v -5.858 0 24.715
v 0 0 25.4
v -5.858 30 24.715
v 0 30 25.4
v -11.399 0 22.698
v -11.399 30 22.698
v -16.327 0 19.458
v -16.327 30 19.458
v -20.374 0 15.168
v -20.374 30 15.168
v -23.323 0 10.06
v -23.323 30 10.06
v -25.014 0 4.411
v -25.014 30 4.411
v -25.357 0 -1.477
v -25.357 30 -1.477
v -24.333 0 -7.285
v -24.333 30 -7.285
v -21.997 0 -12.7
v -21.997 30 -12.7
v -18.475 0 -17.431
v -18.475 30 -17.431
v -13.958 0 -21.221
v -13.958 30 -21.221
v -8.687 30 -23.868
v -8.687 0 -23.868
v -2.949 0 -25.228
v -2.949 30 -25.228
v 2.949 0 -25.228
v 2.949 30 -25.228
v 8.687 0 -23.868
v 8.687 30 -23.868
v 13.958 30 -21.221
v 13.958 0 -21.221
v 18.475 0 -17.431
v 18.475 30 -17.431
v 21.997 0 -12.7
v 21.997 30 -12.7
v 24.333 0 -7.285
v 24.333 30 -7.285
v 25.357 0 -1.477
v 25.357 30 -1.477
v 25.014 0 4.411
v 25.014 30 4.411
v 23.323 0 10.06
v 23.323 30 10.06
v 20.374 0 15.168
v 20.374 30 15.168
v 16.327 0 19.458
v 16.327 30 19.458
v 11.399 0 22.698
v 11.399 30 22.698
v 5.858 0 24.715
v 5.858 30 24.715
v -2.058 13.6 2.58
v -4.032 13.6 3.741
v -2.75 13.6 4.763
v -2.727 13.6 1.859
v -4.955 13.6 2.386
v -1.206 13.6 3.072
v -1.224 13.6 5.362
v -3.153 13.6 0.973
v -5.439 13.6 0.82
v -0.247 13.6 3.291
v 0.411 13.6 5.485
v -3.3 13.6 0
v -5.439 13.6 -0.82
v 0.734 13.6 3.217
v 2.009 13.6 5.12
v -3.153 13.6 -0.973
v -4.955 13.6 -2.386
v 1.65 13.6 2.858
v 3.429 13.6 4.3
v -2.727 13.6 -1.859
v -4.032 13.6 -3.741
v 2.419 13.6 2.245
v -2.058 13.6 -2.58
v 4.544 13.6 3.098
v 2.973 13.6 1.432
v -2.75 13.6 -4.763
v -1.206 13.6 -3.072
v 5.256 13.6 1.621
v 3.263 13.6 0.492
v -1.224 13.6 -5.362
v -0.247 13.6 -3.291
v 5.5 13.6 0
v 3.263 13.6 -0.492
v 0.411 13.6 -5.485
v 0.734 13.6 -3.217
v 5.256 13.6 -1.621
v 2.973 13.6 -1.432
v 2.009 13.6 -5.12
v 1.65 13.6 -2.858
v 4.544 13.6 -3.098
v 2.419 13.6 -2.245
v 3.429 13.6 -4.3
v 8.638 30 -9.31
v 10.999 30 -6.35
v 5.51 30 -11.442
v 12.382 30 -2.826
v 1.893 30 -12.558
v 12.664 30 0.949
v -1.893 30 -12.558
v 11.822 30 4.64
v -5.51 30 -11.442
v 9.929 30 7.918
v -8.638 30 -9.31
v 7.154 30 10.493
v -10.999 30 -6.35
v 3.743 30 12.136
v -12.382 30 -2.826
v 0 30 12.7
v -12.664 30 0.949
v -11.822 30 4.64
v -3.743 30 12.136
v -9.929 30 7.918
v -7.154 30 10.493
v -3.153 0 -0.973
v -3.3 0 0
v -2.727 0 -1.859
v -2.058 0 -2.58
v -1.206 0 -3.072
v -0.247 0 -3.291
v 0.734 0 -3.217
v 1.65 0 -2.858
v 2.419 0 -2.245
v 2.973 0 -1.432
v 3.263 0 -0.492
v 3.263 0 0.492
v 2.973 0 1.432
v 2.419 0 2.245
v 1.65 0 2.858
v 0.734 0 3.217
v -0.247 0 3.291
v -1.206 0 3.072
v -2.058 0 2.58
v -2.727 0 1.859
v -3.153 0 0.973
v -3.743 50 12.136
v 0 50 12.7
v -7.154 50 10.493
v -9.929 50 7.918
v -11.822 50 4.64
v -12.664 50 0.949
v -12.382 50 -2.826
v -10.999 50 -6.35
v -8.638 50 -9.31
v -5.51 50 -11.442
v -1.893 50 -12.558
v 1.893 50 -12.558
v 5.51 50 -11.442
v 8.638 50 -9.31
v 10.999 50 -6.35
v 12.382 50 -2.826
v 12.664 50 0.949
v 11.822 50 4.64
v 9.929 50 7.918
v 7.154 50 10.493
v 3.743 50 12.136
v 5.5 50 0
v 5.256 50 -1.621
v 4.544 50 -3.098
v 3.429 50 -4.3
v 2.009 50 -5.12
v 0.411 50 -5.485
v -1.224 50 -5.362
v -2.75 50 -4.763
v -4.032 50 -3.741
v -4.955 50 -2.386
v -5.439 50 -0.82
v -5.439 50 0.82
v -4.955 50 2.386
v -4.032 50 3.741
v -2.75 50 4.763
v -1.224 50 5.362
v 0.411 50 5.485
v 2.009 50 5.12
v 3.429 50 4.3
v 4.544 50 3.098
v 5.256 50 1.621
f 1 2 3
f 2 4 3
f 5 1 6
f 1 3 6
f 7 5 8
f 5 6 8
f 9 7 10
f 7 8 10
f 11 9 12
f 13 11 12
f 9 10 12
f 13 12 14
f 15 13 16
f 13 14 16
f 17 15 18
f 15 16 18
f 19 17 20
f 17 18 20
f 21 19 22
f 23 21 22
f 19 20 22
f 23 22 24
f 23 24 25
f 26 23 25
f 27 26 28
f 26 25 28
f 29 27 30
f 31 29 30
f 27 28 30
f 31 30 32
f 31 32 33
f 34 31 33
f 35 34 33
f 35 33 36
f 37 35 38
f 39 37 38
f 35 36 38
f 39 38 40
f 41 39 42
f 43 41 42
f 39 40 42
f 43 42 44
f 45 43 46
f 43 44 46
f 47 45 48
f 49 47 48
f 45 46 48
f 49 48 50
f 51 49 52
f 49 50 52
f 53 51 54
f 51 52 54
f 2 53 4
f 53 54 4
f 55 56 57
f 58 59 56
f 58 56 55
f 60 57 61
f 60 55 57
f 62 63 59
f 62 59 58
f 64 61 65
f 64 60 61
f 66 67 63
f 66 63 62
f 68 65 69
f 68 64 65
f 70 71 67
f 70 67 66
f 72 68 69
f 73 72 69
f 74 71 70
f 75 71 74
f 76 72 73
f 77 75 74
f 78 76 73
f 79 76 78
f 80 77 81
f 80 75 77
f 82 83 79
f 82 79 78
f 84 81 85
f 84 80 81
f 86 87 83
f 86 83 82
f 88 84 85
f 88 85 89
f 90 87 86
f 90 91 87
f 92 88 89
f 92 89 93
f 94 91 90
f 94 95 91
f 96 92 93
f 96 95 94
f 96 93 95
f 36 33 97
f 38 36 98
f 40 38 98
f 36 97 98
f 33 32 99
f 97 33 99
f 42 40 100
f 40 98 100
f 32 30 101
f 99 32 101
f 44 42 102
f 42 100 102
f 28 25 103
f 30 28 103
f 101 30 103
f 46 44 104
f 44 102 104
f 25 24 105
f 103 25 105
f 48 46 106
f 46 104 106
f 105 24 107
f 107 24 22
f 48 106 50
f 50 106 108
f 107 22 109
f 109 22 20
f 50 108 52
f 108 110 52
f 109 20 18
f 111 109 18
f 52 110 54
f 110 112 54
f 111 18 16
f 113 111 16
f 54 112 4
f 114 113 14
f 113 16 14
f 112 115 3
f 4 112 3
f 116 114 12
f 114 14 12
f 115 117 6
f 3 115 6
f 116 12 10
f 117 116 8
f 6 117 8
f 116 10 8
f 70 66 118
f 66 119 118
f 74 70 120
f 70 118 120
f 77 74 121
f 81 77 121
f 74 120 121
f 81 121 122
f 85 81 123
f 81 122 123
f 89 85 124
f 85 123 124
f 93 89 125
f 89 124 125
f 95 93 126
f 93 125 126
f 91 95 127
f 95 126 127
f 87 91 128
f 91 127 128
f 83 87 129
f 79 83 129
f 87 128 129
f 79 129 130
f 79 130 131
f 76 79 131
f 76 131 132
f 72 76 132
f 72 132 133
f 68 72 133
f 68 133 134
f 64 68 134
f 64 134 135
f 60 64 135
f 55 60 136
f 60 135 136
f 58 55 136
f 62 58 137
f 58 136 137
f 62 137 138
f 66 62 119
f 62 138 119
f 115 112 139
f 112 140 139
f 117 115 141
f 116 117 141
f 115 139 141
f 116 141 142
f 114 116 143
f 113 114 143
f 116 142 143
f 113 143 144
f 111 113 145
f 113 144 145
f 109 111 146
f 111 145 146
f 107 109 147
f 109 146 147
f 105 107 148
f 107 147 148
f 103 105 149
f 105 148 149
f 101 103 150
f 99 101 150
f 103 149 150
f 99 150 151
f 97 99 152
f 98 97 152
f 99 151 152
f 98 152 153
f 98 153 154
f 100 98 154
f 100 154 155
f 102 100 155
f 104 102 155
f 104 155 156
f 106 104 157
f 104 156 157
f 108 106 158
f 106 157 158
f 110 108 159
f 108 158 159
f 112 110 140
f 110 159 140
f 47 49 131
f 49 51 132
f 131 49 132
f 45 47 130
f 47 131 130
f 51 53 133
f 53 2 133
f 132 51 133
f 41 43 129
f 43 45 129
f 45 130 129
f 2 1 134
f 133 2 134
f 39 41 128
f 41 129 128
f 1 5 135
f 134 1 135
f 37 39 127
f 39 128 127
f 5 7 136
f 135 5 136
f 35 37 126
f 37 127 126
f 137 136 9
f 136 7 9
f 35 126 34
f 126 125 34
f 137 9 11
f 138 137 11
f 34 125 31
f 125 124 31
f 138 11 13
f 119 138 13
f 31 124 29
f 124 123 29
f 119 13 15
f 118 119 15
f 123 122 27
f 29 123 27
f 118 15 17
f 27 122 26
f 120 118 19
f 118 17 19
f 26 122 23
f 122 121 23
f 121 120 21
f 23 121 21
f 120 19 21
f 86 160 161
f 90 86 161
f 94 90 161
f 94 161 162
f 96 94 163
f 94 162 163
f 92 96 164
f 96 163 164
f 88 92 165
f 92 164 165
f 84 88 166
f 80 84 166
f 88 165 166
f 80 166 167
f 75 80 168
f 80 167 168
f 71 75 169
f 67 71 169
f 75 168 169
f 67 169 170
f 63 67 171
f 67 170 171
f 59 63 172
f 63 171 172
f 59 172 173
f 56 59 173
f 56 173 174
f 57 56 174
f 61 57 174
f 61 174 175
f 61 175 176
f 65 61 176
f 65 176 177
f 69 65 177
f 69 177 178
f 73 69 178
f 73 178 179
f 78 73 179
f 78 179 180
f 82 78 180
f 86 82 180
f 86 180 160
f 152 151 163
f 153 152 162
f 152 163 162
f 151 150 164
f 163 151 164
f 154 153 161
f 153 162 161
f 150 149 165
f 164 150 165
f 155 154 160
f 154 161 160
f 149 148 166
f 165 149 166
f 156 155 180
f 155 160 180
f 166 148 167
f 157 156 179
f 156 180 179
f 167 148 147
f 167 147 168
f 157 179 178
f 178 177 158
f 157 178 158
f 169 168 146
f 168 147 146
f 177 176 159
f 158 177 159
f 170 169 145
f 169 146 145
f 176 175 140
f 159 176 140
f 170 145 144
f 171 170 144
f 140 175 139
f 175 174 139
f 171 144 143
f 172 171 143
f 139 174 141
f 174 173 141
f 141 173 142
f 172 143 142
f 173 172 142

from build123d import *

# Parameters (mm, degrees)
REFRENTADO_PARA_TORNILLO_CON_CABEZA_HUEC_D           = 6.6
REFRENTADO_PARA_TORNILLO_CON_CABEZA_HUEC_CBORE_D     = 11
REFRENTADO_PARA_TORNILLO_CON_CABEZA_HUEC_CBORE_DEPTH = 36.4


with BuildPart() as part:
    # Croquis1 → Revolución1 (revolve)
    with BuildSketch(Plane.XY, mode=Mode.PRIVATE) as revoluci_n1_sk:
        Polygon((0, 50), (0, 0), (25.4, 0), (25.4, 30), (12.7, 30), (12.7, 50), align=None)
    revolve(revoluci_n1_sk.sketch.rotate(Axis((0, 50, 0), (0, -1, 0)), 90), axis=Axis((0, 50, 0), (0, -1, 0)))

    # Refrentado para tornillo con cabeza hueca de M61 (through all)
    with Locations(Plane(origin=(0, 50, 0), x_dir=(1, 0, 0), z_dir=(0, 1, 0))):
        with Locations((0, 0)):
            CounterBoreHole(REFRENTADO_PARA_TORNILLO_CON_CABEZA_HUEC_D / 2, REFRENTADO_PARA_TORNILLO_CON_CABEZA_HUEC_CBORE_D / 2, REFRENTADO_PARA_TORNILLO_CON_CABEZA_HUEC_CBORE_DEPTH)


solid = part.part
